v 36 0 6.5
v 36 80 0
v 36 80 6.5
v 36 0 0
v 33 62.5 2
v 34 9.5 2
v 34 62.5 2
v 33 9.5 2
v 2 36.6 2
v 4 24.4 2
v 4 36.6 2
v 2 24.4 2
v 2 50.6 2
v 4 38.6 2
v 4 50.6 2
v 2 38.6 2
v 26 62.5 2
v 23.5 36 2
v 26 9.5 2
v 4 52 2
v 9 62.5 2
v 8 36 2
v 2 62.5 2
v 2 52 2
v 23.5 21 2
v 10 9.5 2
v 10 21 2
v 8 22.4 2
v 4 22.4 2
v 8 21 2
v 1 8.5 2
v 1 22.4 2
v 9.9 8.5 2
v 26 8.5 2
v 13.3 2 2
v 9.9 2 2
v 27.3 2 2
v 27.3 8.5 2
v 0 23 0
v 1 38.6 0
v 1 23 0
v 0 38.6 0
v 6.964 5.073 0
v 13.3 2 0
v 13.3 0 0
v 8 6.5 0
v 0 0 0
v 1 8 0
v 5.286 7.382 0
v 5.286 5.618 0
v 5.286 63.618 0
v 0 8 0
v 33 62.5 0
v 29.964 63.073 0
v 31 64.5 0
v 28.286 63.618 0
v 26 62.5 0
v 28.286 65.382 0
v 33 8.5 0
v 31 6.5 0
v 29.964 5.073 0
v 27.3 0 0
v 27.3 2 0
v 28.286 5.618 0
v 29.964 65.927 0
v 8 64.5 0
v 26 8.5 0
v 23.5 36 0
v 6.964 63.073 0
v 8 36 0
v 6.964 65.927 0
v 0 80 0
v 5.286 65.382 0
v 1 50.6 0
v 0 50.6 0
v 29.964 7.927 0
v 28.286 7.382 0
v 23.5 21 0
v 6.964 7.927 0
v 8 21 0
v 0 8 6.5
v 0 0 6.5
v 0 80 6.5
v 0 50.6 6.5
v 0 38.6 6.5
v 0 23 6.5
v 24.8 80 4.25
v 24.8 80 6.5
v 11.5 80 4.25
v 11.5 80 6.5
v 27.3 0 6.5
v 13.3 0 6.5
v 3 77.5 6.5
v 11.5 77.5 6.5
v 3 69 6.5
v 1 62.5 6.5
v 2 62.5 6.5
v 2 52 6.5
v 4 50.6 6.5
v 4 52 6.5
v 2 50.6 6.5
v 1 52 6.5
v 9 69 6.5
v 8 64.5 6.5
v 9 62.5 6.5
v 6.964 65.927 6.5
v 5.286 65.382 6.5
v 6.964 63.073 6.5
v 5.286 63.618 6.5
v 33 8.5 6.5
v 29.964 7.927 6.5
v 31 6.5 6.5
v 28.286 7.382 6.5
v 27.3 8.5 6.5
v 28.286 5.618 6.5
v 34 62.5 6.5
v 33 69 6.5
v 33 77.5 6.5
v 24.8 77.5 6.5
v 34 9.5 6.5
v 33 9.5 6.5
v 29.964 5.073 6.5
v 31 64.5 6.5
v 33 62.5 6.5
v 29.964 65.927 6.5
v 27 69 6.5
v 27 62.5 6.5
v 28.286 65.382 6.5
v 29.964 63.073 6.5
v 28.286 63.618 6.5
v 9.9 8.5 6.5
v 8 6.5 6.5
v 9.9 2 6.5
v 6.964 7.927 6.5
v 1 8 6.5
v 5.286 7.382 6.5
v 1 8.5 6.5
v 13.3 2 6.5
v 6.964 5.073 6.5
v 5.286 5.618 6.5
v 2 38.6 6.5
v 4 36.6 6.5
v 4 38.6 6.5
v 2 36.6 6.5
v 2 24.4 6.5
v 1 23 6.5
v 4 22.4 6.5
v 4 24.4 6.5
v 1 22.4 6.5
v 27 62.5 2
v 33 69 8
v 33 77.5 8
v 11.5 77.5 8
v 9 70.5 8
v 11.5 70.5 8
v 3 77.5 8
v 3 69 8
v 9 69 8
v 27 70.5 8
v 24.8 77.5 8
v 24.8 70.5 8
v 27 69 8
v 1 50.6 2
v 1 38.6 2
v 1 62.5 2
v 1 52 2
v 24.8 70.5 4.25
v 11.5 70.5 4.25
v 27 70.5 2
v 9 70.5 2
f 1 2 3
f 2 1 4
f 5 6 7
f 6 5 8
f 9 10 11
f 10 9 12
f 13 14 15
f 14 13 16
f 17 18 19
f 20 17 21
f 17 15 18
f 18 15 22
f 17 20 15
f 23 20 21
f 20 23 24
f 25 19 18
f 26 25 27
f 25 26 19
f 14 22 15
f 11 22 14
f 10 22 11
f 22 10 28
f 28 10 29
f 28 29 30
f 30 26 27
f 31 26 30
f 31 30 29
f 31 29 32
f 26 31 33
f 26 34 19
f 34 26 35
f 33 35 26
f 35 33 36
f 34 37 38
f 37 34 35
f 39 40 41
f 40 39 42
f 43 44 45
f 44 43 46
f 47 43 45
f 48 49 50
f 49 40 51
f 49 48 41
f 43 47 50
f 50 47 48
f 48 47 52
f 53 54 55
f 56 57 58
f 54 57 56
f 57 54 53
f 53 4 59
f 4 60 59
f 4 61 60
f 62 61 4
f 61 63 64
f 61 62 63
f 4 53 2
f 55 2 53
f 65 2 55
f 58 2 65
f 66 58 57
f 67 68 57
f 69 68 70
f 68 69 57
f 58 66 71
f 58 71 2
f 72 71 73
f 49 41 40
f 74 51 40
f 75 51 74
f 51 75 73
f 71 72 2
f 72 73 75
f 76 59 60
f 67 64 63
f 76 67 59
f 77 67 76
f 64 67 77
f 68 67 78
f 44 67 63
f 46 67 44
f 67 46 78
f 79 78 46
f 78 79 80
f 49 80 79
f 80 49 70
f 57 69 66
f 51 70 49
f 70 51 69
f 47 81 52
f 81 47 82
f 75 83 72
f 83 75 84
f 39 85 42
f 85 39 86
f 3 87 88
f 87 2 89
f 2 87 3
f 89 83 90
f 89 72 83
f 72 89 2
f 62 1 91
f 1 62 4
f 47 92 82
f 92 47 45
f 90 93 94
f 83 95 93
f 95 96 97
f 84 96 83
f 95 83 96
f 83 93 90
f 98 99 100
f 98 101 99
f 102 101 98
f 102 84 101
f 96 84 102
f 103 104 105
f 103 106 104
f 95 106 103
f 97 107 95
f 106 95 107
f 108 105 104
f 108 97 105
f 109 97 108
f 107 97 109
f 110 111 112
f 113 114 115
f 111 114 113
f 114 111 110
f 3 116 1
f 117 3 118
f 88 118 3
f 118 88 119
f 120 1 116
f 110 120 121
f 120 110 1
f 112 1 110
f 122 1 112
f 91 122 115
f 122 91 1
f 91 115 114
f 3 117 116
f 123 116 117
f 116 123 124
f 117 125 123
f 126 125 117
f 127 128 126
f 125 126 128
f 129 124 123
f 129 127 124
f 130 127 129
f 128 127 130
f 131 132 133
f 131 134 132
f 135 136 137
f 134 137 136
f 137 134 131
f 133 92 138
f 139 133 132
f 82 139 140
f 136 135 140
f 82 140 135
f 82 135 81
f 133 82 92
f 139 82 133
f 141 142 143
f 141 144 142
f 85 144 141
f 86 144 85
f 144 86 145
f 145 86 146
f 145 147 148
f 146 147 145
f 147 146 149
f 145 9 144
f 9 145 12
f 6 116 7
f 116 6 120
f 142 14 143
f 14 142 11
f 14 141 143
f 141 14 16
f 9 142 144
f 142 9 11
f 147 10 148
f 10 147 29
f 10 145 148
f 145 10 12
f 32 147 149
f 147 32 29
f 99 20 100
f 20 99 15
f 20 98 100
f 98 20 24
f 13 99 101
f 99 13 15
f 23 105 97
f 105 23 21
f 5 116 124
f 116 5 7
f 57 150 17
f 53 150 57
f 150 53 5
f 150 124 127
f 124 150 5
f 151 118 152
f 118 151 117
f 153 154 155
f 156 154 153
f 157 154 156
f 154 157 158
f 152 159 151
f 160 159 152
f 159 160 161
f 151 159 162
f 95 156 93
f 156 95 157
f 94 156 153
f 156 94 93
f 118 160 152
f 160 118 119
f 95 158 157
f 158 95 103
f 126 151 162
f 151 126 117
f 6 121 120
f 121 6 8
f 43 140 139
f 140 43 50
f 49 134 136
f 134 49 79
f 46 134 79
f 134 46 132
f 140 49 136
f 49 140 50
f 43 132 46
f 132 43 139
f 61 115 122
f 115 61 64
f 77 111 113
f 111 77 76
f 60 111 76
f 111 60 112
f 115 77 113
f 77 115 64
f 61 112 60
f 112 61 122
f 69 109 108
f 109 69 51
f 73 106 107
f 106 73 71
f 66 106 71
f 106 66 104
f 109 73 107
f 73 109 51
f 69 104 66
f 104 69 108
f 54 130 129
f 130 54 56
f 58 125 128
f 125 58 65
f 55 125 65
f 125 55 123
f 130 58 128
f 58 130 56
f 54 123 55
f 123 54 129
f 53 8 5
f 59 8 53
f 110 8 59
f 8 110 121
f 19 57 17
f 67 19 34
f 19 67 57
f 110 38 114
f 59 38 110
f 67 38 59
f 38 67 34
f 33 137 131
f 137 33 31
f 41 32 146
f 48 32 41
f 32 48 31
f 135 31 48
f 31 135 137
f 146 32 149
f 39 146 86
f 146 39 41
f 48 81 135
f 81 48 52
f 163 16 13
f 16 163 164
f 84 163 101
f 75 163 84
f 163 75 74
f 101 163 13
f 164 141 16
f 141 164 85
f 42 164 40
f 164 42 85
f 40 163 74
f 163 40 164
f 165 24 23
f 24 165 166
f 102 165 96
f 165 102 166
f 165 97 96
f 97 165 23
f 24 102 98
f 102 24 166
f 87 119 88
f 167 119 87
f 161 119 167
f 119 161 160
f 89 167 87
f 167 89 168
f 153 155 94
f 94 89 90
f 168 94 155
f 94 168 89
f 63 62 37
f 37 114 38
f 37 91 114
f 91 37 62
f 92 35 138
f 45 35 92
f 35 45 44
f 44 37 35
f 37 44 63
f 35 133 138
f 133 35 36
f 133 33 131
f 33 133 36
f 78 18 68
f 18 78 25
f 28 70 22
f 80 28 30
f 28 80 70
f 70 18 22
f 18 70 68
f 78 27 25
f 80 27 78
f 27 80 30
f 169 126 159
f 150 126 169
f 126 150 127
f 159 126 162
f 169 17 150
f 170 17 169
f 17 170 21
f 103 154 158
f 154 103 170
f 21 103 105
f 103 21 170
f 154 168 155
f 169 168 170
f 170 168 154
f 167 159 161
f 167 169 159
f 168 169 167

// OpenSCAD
baseWidth = 36;    // X
baseLength = 80;   // y
baseHeighth = 2;   // Z
baseThickness = 2;



wallThickness = 2;
wallHeigthNoBase = 6.5;
wallHeighthMinusBase = wallHeigthNoBase-baseThickness;

baseLengthInner = baseLength-(2*wallThickness);
baseWidthInner = baseWidth-(2*wallThickness);

//baseSDPadMountHeigth = 4;
baseSDColumnSupports = wallHeighthMinusBase;
screwHoleRadius = 1.5;

//SD card side
screwholeSDX1Offset = wallThickness+3.5+1; //might try .4 instead of 1
screwholeSDX2Offset = screwholeSDX1Offset+23;
screwholeSDY1Offset = wallThickness+3.5+1;

screwwholeSCameraY1Offset = screwholeSDY1Offset+58;

// Camera/STEM side
PCBThickness = 1.5;

//GPIO dimensions
GPIOXval = 7;
GPIOYVal = 54;



// translate([]) cube([]);
difference(){

union(){
////////////////////////////////////////////////////
// Base
cube([baseWidth,baseLength,baseHeighth]);

////////////////////////////////////////////////////
// WALLS
// SD Card outer wall
translate([0,0,baseThickness]) cube([baseWidth,wallThickness,wallHeighthMinusBase]);

////////////////////////////////////////////////////
// GPIO Side
translate([0,wallThickness,baseThickness]) cube([wallThickness,baseLengthInner,wallHeighthMinusBase]);

////////////////////////////////////////////////////
// Ports side (HDMI, USB, etc
translate([baseWidthInner+wallThickness,wallThickness,baseThickness]) cube([wallThickness,baseLengthInner,wallHeighthMinusBase]);
    
    // Support in between HDMI and USB
    // STEM Side
    translate([wallThickness,wallThickness+34.6,baseThickness]) cube([2,2,wallHeighthMinusBase]);
    // SD Card side
    translate([wallThickness,wallThickness+20.4,baseThickness]) cube([2,2,wallHeighthMinusBase]);
    
    // Support next to USB Power
    translate([wallThickness,wallThickness+48.6,baseThickness]) cube([2,1.4,wallHeighthMinusBase]);

////////////////////////////////////////////////////
// Camera/Stem side
translate([0,baseLengthInner+wallThickness,baseThickness]) cube([baseWidth,wallThickness,wallHeighthMinusBase]);

// RasPi PCB supports, camera/STEM side
translate([wallThickness,screwwholeSCameraY1Offset-2,baseThickness]) cube([baseWidthInner,baseLengthInner-screwwholeSCameraY1Offset+wallThickness+2,baseSDColumnSupports]);

// Above the model, supports the STEM board directly
translate([wallThickness+1,screwwholeSCameraY1Offset+4.5,baseThickness+baseSDColumnSupports]) cube([baseWidthInner-2,baseLengthInner-screwwholeSCameraY1Offset-3,PCBThickness]);
    // I made it slightly smaller (1mm on X and Y) so that it won't rub against the top when assemlbed.

////////////////////////////////////////////////////
// SD Card side 
// Raspi0w PCB rest
    // Used in the bottom, but not the top
//translate([wallThickness,wallThickness,baseThickness]) cube([baseWidthInner,7.5,baseSDPadMountHeigth]);
// Z axis of 4 is height of plate where raspi rests

// Used in top, but not bottom
translate([wallThickness,wallThickness,baseThickness]) cube([baseWidthInner,7.5,baseSDColumnSupports]);


} // end union //////////////////////////////////////
/////////////////////////////////////////////////////


//cylinder(h = height, r1 = BottomRadius, r2 = TopRadius, center = true/false);

////////////////////////////////////////////////////
// Cut outs for screws
// SD Card side screws
translate([screwholeSDX1Offset,screwholeSDY1Offset,0]) cylinder(baseThickness+baseSDColumnSupports,screwHoleRadius, screwHoleRadius,false);
translate([screwholeSDX2Offset,screwholeSDY1Offset,0]) cylinder(baseThickness+baseSDColumnSupports,screwHoleRadius, screwHoleRadius,false);

// Camera Side screws
translate([screwholeSDX1Offset,screwwholeSCameraY1Offset,0]) cylinder(baseThickness+baseSDColumnSupports,screwHoleRadius, screwHoleRadius,false);
translate([screwholeSDX2Offset,screwwholeSCameraY1Offset,0]) cylinder(baseThickness+baseSDColumnSupports,screwHoleRadius, screwHoleRadius,false);


////////////////////////////////////////////////////
// Cut out for GPIO
// GPIO cutout will be on bottom
translate([wallThickness+baseWidthInner-GPIOXval-1,wallThickness+6.5,0]) cube([GPIOXval,GPIOYVal,baseThickness+baseSDColumnSupports]);

////////////////////////////////////////////////////
// Cut outs for Ports side
// HDMI
translate([0,wallThickness+6.5,baseThickness]) cube([wallThickness+8,13.9,wallHeighthMinusBase]);
    // wallThickness+7 is how far in the hole starts
    // 13.9 is the width of the hole for the hdmi connector
    //wallThickness+8 is how deep the HDMI connector is
translate([0,wallThickness+6,0]) cube([.5*wallThickness,15,wallHeigthNoBase]);

// USB OTG
translate([0,wallThickness+36.6,baseThickness]) cube([wallThickness,12,wallHeighthMinusBase]);
    // wallThickness+36.6 is how far in the hole starts

translate([0,wallThickness+36.6,0]) cube([.5*wallThickness,12,wallHeigthNoBase]);

//USB Power
translate([.5*wallThickness,wallThickness+50,baseThickness]) cube([wallThickness*.5,10.5,wallHeighthMinusBase]);
    // 10.5 makes it match up with the PCB support

////////////////////////////////////////////////////
// Cut out for USB Stem in wall
translate([wallThickness+9.5,baseLengthInner+wallThickness,baseThickness+2.25]) cube([13.3,wallThickness,wallHeighthMinusBase-2.25]);
    // wallThickness+8.9 is how far in the hole starts
    // baseThickness+3.25 is how high up the hole starts.
    // 14.5 is the widtch of the USB connector
    // wallHeighthMinusBase-2.25 is how tall the cutout will be

////////////////////////////////////////////////////
// Cut out for SD Card access
// Removes the wall for SD card access
translate([13.3,0,0]) cube([14,wallThickness,wallHeigthNoBase]);
// Removes material inside the wallwhere the SD card is on the board
translate([9.9,wallThickness,baseThickness]) cube([17.4,7.5,wallHeighthMinusBase]);

////////////////////////////////////////////////////
// Cut out for Heatsink
translate([8,21,0]) cube([15.5,15,baseThickness]);

// Remove material for Camera/STEM side PCB support
// Just where the PCB columns are
translate([wallThickness+7,screwwholeSCameraY1Offset-2,baseThickness]) cube([18,6,wallHeighthMinusBase+PCBThickness]);
    // 6 is Y value for PCB supports

// Around the camera connector
translate([wallThickness+7,screwwholeSCameraY1Offset-2+6,baseThickness]) cube([18,2,wallHeighthMinusBase+PCBThickness]);

// Just between the columns and the wall
// Supports the USB connector directly
translate([wallThickness+9.5,screwwholeSCameraY1Offset-2+6+2,baseThickness+2.25]) cube([13.3,baseLengthInner-screwwholeSCameraY1Offset+wallThickness+2-6-2,wallHeighthMinusBase+PCBThickness]);







} // end difference
